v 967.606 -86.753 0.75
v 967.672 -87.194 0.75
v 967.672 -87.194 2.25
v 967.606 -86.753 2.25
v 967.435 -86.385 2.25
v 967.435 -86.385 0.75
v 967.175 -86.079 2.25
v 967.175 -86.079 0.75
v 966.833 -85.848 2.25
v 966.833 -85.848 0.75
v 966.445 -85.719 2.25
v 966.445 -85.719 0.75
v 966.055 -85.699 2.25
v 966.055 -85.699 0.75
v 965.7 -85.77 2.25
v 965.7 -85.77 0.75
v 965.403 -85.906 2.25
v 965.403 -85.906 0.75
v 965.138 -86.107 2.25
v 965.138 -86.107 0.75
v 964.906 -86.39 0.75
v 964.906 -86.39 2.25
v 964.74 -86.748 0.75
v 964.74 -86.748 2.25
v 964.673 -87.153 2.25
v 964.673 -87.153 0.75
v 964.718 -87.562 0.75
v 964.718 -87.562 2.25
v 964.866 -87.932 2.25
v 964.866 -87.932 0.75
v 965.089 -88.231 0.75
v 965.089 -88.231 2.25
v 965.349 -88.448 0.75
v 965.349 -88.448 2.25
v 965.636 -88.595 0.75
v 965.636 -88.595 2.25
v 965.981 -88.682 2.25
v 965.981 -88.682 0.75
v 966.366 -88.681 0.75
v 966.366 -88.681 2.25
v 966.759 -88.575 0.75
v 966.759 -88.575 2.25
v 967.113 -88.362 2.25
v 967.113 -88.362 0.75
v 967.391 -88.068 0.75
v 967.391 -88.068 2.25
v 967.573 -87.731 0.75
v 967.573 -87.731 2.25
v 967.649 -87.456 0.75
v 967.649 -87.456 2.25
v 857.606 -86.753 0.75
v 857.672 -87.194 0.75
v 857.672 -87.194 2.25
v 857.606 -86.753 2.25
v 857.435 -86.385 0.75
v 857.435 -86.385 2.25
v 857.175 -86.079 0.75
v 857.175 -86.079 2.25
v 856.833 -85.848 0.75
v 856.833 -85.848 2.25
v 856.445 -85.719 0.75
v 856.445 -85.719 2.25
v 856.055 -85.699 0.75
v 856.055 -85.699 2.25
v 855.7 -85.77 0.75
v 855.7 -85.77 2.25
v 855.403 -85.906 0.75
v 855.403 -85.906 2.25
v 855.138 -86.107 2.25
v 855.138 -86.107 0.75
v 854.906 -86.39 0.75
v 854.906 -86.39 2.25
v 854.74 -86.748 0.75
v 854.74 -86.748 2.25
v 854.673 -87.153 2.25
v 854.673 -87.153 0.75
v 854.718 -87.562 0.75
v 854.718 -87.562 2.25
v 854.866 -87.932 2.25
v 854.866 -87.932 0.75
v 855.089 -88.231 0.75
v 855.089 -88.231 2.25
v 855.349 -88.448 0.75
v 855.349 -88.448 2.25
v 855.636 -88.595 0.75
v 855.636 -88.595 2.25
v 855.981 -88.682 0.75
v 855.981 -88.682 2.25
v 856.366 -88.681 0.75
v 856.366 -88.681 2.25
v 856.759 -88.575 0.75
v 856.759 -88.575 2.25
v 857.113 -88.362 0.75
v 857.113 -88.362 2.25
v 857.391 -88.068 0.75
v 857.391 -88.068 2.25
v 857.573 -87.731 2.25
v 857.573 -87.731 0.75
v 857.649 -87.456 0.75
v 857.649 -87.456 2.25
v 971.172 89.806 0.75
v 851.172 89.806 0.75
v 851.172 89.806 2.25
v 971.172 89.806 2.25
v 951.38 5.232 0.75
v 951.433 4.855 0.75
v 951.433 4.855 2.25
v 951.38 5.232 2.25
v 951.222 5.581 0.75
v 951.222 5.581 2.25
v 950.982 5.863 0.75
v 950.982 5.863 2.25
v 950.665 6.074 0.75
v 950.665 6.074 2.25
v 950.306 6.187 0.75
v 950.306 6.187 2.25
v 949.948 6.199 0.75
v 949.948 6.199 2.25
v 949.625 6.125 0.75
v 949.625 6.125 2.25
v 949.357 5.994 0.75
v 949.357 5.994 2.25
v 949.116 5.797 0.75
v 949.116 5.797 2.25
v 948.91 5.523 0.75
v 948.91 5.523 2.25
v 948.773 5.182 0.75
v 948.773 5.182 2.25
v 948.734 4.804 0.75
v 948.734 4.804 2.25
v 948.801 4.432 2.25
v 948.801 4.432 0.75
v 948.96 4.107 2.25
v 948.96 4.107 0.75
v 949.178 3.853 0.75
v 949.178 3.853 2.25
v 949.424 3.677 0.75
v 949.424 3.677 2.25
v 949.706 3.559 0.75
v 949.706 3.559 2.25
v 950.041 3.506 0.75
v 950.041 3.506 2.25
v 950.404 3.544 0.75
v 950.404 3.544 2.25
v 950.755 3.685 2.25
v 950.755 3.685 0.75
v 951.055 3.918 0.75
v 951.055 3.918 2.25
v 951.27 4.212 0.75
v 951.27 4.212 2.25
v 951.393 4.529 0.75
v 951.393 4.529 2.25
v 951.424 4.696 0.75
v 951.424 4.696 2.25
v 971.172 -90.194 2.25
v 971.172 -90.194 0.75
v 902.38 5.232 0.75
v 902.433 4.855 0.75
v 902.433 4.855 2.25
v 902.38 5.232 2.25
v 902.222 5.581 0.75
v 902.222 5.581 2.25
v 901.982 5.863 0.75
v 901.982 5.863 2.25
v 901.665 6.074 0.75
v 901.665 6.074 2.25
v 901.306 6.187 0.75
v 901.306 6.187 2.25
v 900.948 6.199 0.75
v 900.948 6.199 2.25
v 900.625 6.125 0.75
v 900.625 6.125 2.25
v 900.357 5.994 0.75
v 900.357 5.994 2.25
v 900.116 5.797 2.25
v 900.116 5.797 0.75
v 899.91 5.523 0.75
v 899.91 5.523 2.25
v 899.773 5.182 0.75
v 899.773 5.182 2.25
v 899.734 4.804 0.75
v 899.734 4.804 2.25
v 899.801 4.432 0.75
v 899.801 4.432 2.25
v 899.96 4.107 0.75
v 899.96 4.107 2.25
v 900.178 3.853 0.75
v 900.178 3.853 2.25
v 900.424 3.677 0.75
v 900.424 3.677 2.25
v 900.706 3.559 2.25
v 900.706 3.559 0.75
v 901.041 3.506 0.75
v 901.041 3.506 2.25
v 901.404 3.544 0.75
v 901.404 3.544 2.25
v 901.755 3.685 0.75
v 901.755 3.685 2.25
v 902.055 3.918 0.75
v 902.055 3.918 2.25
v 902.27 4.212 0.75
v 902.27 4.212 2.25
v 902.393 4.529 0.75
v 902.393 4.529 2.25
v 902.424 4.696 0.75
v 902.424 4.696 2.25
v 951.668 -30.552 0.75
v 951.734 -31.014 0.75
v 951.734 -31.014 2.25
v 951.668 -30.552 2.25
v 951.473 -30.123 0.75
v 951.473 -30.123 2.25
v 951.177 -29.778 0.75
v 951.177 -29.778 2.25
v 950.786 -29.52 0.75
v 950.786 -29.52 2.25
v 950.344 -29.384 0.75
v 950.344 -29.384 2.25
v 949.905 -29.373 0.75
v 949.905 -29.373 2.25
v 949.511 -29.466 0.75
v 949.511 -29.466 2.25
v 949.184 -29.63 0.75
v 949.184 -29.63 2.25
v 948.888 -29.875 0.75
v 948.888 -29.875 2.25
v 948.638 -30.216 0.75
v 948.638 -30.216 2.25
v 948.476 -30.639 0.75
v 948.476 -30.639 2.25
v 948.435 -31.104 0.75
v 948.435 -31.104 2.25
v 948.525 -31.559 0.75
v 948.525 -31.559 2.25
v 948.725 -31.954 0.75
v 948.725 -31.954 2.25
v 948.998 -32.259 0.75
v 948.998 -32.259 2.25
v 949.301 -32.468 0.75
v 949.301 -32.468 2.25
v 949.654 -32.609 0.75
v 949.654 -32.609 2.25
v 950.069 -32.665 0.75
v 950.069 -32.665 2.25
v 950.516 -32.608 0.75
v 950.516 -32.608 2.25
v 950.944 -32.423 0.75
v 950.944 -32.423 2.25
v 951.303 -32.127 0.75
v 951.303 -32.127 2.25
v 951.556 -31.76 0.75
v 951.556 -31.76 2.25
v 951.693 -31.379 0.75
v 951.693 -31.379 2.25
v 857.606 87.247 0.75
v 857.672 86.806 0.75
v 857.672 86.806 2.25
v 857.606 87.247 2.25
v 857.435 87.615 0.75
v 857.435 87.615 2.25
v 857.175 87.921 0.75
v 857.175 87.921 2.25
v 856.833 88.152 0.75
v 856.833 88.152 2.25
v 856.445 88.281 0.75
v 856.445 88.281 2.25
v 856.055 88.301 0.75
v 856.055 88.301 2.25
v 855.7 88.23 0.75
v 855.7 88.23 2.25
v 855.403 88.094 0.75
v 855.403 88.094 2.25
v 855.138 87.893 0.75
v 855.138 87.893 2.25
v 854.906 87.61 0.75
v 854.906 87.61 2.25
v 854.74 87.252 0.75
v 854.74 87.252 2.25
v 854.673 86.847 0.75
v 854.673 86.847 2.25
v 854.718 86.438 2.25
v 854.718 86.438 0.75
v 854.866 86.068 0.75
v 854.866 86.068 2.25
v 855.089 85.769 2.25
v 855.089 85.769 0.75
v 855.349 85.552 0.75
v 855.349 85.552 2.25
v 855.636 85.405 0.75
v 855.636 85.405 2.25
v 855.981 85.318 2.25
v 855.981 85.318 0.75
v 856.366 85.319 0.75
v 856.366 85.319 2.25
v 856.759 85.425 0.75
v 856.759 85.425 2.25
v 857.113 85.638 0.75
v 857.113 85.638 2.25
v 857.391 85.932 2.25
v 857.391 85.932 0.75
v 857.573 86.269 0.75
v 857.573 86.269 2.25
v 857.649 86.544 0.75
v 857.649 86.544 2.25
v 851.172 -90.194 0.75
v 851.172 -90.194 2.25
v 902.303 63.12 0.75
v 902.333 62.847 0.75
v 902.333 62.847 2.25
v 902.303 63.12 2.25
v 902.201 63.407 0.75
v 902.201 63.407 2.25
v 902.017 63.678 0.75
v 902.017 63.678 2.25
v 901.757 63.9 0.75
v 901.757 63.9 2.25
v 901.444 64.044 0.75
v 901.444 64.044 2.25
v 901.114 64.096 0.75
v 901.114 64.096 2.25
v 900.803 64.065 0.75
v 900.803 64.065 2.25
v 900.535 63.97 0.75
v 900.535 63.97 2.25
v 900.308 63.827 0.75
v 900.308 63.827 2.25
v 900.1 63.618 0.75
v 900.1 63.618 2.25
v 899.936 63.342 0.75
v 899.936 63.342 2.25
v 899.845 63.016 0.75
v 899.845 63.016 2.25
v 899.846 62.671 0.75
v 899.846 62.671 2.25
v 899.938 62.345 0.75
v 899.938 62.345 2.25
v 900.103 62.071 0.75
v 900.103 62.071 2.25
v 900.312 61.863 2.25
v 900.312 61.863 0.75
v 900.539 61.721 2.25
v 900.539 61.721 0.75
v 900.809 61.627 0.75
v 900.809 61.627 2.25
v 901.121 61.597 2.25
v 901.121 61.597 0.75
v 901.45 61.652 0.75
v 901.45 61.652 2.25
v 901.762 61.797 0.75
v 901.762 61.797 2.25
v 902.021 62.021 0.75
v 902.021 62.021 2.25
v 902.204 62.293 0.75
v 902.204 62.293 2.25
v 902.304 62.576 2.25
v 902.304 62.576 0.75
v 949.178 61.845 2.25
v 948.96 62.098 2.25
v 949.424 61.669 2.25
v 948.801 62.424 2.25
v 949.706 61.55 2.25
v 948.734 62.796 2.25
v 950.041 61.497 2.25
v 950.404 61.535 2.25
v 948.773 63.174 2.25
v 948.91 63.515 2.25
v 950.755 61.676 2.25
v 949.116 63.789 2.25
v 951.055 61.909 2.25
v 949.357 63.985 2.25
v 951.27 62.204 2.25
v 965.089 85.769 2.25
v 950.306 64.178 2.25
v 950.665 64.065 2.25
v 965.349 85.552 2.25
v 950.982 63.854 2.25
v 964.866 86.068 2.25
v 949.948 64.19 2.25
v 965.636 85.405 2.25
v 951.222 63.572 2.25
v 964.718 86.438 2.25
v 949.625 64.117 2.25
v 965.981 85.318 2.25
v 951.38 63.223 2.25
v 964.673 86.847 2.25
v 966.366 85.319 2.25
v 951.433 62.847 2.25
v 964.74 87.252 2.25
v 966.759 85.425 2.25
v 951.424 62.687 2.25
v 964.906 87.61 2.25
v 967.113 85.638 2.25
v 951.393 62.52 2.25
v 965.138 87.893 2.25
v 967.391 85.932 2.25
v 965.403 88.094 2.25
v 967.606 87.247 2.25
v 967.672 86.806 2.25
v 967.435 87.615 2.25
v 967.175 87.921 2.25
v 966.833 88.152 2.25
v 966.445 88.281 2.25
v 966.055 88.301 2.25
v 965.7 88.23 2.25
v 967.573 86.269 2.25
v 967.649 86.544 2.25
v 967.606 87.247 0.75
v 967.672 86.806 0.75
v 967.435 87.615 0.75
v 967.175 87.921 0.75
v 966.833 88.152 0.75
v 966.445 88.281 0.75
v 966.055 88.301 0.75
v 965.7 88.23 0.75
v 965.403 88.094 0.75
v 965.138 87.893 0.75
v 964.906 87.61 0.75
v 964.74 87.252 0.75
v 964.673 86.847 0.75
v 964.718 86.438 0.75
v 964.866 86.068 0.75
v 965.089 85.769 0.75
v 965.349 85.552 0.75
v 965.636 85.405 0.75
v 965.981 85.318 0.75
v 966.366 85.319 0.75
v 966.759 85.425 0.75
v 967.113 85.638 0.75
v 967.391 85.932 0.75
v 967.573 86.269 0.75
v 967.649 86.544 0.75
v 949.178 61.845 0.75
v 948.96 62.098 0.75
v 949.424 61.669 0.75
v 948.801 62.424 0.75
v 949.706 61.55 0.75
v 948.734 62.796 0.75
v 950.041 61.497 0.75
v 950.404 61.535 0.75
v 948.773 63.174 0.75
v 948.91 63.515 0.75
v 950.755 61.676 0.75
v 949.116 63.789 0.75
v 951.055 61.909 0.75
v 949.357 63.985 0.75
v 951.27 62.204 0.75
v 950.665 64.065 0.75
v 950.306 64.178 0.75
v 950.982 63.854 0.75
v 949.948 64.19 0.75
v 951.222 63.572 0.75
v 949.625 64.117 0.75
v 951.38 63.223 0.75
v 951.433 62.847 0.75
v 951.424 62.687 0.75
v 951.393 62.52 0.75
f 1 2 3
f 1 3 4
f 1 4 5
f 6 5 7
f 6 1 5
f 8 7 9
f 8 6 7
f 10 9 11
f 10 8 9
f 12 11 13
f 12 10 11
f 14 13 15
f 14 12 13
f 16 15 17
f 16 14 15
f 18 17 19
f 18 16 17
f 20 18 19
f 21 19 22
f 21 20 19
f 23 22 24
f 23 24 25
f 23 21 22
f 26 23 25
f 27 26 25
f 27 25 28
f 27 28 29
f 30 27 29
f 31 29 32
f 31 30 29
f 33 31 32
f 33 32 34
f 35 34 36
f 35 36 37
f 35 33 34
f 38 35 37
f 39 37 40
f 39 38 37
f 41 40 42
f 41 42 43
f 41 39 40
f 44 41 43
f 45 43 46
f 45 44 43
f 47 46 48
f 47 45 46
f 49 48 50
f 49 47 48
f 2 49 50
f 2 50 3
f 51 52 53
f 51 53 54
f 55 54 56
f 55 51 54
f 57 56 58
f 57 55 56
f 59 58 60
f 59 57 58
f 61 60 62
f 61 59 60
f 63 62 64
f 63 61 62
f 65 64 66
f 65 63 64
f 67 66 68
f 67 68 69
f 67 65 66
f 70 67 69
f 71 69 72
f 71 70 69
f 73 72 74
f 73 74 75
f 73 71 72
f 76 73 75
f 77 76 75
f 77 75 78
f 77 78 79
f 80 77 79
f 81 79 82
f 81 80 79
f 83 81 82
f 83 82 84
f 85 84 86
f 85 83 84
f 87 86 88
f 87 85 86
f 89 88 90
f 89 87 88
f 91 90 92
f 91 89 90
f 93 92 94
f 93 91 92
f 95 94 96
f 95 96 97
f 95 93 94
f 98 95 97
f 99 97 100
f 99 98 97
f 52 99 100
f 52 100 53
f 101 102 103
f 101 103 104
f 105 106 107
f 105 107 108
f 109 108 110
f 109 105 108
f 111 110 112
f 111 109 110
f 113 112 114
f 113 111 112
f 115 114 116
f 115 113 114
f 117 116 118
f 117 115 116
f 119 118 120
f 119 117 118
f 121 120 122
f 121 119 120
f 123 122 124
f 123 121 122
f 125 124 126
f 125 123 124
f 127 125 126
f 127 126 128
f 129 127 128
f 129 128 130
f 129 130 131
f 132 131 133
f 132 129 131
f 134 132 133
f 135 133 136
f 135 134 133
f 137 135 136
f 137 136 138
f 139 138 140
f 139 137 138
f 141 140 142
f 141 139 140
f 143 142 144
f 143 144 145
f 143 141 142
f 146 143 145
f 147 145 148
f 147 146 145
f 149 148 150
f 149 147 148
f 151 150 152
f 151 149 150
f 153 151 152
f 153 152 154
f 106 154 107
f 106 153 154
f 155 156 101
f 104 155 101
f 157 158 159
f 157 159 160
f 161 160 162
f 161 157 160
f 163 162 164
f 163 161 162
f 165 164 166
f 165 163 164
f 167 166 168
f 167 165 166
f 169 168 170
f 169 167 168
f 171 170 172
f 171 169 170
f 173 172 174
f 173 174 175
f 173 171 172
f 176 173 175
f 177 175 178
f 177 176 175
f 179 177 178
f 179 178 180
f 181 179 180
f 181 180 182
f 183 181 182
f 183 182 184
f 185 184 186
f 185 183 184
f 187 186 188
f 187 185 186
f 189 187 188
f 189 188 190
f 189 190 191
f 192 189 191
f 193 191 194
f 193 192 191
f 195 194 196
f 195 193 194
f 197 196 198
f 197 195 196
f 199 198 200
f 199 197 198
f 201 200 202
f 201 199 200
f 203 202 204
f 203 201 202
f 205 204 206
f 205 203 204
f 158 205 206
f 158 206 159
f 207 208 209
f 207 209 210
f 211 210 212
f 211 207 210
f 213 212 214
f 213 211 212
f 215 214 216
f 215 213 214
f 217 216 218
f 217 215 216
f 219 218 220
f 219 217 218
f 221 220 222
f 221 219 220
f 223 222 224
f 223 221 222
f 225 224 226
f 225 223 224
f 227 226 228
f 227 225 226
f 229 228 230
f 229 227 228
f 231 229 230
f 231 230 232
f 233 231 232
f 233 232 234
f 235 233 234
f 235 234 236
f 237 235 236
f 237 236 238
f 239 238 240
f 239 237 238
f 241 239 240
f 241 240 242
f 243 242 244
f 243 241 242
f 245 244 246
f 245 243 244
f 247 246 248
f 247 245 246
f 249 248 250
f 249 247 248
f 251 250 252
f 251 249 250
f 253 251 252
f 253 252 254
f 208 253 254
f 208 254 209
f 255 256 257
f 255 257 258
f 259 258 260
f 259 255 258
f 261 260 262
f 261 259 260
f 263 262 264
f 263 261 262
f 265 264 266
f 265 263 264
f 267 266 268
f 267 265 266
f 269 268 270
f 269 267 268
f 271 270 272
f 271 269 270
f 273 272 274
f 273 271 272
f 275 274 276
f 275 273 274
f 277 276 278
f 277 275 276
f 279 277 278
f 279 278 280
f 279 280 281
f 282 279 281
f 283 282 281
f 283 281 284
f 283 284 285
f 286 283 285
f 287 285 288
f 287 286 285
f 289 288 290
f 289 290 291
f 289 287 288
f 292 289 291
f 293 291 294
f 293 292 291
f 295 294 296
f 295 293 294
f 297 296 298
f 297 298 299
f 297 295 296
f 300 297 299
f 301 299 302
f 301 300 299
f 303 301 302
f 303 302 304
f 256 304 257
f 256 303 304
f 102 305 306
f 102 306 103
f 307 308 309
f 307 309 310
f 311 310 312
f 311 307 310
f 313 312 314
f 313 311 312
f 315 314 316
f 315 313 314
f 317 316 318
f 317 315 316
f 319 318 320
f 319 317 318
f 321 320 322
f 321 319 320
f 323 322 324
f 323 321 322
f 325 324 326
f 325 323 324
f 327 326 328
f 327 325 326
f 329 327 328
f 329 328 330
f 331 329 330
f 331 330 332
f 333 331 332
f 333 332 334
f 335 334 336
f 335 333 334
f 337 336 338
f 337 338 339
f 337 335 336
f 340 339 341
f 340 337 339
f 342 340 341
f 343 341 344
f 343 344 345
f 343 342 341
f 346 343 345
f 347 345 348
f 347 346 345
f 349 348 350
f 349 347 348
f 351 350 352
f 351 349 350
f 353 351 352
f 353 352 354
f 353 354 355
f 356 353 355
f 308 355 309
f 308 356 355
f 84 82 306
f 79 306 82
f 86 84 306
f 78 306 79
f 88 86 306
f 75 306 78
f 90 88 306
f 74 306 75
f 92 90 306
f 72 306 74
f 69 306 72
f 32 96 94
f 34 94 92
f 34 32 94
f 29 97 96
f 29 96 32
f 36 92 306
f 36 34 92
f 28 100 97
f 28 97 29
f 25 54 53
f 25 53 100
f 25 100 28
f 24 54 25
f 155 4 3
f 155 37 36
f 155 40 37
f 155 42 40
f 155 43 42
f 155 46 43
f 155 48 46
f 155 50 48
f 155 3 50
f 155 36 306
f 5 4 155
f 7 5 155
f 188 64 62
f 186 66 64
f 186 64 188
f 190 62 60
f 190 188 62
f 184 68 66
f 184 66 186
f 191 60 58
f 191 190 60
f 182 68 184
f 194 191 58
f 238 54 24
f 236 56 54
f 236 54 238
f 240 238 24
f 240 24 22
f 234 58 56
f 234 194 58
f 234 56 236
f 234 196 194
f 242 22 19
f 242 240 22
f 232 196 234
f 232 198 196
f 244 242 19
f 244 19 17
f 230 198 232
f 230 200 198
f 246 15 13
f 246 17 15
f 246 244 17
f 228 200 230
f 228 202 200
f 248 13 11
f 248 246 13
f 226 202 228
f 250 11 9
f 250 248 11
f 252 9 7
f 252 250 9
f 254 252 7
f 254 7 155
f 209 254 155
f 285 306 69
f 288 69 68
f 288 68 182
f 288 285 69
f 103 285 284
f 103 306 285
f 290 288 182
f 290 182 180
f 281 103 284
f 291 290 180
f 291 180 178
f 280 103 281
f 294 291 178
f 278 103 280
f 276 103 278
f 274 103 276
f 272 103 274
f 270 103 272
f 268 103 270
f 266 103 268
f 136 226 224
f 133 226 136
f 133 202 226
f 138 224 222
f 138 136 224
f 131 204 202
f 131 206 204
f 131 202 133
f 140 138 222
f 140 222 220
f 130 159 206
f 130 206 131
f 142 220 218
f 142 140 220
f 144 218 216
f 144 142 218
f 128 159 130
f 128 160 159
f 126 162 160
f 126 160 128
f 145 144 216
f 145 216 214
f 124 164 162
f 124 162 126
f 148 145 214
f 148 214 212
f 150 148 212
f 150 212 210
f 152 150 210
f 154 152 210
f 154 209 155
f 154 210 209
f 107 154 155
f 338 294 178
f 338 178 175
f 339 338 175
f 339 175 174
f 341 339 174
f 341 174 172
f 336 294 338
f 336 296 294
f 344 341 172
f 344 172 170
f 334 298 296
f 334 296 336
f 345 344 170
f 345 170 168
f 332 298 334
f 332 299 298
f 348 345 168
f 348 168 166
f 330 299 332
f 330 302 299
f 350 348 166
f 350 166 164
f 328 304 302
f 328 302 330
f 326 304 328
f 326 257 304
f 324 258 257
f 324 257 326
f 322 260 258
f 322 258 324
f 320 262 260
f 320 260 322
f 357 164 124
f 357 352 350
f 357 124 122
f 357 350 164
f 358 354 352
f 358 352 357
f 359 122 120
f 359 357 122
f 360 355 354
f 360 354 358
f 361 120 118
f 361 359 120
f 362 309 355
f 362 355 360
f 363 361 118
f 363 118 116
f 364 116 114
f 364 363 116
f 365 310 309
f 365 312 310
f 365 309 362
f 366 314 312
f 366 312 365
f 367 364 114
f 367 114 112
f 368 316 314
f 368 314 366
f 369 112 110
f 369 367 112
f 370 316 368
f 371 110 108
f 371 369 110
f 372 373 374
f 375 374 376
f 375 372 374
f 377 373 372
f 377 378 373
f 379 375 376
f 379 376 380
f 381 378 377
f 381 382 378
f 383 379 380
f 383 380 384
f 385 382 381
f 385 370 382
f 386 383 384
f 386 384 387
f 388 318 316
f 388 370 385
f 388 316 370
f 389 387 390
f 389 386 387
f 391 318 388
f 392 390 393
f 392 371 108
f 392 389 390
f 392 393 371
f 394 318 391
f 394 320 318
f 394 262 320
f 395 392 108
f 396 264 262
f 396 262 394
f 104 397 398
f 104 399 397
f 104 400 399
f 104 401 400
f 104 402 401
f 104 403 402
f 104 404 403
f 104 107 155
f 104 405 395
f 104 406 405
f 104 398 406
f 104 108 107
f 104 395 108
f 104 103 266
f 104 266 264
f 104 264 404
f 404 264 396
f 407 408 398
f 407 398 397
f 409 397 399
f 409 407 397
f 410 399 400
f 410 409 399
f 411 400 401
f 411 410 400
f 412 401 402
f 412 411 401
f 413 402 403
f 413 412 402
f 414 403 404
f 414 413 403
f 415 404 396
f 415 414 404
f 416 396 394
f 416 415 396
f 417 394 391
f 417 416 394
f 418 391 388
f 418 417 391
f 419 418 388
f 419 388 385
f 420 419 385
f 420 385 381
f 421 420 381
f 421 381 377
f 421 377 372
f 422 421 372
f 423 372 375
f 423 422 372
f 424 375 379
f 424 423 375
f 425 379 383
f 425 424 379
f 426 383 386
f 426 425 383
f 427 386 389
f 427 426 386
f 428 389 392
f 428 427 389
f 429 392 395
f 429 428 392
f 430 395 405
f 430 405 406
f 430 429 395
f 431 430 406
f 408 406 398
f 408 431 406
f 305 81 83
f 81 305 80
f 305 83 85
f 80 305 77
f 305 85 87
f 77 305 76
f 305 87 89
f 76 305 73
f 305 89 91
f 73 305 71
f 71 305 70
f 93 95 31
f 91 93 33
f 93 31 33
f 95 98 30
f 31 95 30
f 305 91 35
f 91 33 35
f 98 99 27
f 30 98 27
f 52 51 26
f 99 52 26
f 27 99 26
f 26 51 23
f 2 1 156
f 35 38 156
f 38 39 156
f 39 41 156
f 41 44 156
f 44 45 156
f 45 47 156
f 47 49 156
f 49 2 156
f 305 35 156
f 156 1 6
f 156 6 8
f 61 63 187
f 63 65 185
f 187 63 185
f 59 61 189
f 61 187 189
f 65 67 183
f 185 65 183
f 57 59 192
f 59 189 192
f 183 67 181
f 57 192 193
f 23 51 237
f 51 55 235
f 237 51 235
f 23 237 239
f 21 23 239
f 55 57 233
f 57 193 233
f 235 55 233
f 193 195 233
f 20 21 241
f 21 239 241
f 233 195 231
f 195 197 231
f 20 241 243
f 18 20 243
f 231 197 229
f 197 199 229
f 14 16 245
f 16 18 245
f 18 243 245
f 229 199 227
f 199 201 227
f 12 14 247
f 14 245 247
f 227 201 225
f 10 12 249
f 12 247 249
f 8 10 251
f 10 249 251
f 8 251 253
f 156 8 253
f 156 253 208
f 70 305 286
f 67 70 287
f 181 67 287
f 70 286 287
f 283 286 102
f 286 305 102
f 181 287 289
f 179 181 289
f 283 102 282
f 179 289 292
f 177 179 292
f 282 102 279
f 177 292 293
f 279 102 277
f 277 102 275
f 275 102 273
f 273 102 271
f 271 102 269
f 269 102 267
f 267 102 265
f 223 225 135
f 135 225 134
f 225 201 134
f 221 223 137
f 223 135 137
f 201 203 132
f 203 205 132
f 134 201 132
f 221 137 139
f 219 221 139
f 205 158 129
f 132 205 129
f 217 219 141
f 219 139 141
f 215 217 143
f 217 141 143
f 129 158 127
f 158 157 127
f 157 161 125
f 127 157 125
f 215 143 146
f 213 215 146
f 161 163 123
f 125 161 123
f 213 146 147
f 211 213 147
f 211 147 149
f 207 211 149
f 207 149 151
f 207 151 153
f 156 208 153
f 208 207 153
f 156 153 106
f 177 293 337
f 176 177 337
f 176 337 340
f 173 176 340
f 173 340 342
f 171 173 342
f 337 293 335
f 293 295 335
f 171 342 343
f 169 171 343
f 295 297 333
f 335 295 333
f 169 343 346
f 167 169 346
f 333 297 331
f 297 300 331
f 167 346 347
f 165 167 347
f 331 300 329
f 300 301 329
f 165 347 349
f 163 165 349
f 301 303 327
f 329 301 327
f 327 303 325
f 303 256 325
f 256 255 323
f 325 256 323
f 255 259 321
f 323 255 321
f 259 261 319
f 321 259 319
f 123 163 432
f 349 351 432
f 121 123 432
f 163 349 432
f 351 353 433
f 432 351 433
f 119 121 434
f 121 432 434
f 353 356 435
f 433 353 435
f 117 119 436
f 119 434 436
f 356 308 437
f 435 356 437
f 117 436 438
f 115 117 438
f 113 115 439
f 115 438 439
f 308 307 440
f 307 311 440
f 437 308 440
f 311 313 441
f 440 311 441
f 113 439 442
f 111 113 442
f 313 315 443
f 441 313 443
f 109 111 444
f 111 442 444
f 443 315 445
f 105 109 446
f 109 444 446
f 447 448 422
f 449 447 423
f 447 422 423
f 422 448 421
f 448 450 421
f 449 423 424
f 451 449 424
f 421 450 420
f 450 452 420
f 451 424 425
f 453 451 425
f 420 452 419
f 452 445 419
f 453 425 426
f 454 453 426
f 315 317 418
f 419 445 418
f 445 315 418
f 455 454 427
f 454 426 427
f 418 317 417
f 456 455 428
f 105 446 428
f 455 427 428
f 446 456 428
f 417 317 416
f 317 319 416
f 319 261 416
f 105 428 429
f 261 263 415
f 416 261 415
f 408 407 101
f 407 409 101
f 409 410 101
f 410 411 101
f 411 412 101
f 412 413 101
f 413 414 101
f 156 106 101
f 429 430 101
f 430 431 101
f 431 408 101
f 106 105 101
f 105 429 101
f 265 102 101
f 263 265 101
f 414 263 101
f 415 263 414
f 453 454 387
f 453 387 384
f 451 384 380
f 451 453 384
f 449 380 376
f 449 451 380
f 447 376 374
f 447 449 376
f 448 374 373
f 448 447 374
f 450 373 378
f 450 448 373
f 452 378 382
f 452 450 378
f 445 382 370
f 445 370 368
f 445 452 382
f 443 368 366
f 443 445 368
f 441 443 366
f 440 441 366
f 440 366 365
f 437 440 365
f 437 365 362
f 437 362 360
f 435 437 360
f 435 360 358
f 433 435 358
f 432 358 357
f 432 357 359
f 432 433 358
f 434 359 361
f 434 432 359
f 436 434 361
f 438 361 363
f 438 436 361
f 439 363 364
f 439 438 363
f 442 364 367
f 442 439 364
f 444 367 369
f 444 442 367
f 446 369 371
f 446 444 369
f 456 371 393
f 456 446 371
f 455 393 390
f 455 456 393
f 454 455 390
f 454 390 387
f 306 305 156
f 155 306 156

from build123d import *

# Parameters (mm, degrees)
SKETCH_1_W      = 1200
SKETCH_1_H      = 1800
SKETCH_1_R      = 15
SKETCH_1_R_2    = 13.5
SKETCH_1_R_3    = 12.5
SKETCH_1_R_4    = 16.51
EXTRUDE_1_DEPTH = 3
SCALE_1_SCALE_X = 0.1
SCALE_1_SCALE_Y = 0.1
SCALE_1_SCALE_Z = 0.5


with BuildPart() as part:
    # 草图1 → 凸台-拉伸1 (new body)
    with BuildSketch(Plane.XY):
        with Locations((911.452724683, 0)):
            Rectangle(SKETCH_1_W, SKETCH_1_H)
        with Locations((361.452724683, 870)):
            Circle(SKETCH_1_R, mode=Mode.SUBTRACT)
        with Locations((810.562965783, 50.494241768)):
            Circle(SKETCH_1_R_2, mode=Mode.SUBTRACT)
        with Locations((1300.562956283, 50.494241768)):
            Circle(SKETCH_1_R_2, mode=Mode.SUBTRACT)
        with Locations((1300.562956283, 630.408028512)):
            Circle(SKETCH_1_R_2, mode=Mode.SUBTRACT)
        with Locations((810.562965783, 630.40802886)):
            Circle(SKETCH_1_R_3, mode=Mode.SUBTRACT)
        with Locations((1461.452724683, 870)):
            Circle(SKETCH_1_R, mode=Mode.SUBTRACT)
        with Locations((361.452724683, -870)):
            Circle(SKETCH_1_R, mode=Mode.SUBTRACT)
        with Locations((1461.452724683, -870)):
            Circle(SKETCH_1_R, mode=Mode.SUBTRACT)
        with Locations((1300.562956283, -308.203766853)):
            Circle(SKETCH_1_R_4, mode=Mode.SUBTRACT)
    extrude(amount=EXTRUDE_1_DEPTH)


with BuildPart() as part_1:
    # 缩放比例1: scaled about (911.140997431, -0.215536981, 1.5)
    add(part.part.scale((SCALE_1_SCALE_X, SCALE_1_SCALE_Y, SCALE_1_SCALE_Z), about=(911.140997431, -0.215536981, 1.5)))


solid = part_1.part
